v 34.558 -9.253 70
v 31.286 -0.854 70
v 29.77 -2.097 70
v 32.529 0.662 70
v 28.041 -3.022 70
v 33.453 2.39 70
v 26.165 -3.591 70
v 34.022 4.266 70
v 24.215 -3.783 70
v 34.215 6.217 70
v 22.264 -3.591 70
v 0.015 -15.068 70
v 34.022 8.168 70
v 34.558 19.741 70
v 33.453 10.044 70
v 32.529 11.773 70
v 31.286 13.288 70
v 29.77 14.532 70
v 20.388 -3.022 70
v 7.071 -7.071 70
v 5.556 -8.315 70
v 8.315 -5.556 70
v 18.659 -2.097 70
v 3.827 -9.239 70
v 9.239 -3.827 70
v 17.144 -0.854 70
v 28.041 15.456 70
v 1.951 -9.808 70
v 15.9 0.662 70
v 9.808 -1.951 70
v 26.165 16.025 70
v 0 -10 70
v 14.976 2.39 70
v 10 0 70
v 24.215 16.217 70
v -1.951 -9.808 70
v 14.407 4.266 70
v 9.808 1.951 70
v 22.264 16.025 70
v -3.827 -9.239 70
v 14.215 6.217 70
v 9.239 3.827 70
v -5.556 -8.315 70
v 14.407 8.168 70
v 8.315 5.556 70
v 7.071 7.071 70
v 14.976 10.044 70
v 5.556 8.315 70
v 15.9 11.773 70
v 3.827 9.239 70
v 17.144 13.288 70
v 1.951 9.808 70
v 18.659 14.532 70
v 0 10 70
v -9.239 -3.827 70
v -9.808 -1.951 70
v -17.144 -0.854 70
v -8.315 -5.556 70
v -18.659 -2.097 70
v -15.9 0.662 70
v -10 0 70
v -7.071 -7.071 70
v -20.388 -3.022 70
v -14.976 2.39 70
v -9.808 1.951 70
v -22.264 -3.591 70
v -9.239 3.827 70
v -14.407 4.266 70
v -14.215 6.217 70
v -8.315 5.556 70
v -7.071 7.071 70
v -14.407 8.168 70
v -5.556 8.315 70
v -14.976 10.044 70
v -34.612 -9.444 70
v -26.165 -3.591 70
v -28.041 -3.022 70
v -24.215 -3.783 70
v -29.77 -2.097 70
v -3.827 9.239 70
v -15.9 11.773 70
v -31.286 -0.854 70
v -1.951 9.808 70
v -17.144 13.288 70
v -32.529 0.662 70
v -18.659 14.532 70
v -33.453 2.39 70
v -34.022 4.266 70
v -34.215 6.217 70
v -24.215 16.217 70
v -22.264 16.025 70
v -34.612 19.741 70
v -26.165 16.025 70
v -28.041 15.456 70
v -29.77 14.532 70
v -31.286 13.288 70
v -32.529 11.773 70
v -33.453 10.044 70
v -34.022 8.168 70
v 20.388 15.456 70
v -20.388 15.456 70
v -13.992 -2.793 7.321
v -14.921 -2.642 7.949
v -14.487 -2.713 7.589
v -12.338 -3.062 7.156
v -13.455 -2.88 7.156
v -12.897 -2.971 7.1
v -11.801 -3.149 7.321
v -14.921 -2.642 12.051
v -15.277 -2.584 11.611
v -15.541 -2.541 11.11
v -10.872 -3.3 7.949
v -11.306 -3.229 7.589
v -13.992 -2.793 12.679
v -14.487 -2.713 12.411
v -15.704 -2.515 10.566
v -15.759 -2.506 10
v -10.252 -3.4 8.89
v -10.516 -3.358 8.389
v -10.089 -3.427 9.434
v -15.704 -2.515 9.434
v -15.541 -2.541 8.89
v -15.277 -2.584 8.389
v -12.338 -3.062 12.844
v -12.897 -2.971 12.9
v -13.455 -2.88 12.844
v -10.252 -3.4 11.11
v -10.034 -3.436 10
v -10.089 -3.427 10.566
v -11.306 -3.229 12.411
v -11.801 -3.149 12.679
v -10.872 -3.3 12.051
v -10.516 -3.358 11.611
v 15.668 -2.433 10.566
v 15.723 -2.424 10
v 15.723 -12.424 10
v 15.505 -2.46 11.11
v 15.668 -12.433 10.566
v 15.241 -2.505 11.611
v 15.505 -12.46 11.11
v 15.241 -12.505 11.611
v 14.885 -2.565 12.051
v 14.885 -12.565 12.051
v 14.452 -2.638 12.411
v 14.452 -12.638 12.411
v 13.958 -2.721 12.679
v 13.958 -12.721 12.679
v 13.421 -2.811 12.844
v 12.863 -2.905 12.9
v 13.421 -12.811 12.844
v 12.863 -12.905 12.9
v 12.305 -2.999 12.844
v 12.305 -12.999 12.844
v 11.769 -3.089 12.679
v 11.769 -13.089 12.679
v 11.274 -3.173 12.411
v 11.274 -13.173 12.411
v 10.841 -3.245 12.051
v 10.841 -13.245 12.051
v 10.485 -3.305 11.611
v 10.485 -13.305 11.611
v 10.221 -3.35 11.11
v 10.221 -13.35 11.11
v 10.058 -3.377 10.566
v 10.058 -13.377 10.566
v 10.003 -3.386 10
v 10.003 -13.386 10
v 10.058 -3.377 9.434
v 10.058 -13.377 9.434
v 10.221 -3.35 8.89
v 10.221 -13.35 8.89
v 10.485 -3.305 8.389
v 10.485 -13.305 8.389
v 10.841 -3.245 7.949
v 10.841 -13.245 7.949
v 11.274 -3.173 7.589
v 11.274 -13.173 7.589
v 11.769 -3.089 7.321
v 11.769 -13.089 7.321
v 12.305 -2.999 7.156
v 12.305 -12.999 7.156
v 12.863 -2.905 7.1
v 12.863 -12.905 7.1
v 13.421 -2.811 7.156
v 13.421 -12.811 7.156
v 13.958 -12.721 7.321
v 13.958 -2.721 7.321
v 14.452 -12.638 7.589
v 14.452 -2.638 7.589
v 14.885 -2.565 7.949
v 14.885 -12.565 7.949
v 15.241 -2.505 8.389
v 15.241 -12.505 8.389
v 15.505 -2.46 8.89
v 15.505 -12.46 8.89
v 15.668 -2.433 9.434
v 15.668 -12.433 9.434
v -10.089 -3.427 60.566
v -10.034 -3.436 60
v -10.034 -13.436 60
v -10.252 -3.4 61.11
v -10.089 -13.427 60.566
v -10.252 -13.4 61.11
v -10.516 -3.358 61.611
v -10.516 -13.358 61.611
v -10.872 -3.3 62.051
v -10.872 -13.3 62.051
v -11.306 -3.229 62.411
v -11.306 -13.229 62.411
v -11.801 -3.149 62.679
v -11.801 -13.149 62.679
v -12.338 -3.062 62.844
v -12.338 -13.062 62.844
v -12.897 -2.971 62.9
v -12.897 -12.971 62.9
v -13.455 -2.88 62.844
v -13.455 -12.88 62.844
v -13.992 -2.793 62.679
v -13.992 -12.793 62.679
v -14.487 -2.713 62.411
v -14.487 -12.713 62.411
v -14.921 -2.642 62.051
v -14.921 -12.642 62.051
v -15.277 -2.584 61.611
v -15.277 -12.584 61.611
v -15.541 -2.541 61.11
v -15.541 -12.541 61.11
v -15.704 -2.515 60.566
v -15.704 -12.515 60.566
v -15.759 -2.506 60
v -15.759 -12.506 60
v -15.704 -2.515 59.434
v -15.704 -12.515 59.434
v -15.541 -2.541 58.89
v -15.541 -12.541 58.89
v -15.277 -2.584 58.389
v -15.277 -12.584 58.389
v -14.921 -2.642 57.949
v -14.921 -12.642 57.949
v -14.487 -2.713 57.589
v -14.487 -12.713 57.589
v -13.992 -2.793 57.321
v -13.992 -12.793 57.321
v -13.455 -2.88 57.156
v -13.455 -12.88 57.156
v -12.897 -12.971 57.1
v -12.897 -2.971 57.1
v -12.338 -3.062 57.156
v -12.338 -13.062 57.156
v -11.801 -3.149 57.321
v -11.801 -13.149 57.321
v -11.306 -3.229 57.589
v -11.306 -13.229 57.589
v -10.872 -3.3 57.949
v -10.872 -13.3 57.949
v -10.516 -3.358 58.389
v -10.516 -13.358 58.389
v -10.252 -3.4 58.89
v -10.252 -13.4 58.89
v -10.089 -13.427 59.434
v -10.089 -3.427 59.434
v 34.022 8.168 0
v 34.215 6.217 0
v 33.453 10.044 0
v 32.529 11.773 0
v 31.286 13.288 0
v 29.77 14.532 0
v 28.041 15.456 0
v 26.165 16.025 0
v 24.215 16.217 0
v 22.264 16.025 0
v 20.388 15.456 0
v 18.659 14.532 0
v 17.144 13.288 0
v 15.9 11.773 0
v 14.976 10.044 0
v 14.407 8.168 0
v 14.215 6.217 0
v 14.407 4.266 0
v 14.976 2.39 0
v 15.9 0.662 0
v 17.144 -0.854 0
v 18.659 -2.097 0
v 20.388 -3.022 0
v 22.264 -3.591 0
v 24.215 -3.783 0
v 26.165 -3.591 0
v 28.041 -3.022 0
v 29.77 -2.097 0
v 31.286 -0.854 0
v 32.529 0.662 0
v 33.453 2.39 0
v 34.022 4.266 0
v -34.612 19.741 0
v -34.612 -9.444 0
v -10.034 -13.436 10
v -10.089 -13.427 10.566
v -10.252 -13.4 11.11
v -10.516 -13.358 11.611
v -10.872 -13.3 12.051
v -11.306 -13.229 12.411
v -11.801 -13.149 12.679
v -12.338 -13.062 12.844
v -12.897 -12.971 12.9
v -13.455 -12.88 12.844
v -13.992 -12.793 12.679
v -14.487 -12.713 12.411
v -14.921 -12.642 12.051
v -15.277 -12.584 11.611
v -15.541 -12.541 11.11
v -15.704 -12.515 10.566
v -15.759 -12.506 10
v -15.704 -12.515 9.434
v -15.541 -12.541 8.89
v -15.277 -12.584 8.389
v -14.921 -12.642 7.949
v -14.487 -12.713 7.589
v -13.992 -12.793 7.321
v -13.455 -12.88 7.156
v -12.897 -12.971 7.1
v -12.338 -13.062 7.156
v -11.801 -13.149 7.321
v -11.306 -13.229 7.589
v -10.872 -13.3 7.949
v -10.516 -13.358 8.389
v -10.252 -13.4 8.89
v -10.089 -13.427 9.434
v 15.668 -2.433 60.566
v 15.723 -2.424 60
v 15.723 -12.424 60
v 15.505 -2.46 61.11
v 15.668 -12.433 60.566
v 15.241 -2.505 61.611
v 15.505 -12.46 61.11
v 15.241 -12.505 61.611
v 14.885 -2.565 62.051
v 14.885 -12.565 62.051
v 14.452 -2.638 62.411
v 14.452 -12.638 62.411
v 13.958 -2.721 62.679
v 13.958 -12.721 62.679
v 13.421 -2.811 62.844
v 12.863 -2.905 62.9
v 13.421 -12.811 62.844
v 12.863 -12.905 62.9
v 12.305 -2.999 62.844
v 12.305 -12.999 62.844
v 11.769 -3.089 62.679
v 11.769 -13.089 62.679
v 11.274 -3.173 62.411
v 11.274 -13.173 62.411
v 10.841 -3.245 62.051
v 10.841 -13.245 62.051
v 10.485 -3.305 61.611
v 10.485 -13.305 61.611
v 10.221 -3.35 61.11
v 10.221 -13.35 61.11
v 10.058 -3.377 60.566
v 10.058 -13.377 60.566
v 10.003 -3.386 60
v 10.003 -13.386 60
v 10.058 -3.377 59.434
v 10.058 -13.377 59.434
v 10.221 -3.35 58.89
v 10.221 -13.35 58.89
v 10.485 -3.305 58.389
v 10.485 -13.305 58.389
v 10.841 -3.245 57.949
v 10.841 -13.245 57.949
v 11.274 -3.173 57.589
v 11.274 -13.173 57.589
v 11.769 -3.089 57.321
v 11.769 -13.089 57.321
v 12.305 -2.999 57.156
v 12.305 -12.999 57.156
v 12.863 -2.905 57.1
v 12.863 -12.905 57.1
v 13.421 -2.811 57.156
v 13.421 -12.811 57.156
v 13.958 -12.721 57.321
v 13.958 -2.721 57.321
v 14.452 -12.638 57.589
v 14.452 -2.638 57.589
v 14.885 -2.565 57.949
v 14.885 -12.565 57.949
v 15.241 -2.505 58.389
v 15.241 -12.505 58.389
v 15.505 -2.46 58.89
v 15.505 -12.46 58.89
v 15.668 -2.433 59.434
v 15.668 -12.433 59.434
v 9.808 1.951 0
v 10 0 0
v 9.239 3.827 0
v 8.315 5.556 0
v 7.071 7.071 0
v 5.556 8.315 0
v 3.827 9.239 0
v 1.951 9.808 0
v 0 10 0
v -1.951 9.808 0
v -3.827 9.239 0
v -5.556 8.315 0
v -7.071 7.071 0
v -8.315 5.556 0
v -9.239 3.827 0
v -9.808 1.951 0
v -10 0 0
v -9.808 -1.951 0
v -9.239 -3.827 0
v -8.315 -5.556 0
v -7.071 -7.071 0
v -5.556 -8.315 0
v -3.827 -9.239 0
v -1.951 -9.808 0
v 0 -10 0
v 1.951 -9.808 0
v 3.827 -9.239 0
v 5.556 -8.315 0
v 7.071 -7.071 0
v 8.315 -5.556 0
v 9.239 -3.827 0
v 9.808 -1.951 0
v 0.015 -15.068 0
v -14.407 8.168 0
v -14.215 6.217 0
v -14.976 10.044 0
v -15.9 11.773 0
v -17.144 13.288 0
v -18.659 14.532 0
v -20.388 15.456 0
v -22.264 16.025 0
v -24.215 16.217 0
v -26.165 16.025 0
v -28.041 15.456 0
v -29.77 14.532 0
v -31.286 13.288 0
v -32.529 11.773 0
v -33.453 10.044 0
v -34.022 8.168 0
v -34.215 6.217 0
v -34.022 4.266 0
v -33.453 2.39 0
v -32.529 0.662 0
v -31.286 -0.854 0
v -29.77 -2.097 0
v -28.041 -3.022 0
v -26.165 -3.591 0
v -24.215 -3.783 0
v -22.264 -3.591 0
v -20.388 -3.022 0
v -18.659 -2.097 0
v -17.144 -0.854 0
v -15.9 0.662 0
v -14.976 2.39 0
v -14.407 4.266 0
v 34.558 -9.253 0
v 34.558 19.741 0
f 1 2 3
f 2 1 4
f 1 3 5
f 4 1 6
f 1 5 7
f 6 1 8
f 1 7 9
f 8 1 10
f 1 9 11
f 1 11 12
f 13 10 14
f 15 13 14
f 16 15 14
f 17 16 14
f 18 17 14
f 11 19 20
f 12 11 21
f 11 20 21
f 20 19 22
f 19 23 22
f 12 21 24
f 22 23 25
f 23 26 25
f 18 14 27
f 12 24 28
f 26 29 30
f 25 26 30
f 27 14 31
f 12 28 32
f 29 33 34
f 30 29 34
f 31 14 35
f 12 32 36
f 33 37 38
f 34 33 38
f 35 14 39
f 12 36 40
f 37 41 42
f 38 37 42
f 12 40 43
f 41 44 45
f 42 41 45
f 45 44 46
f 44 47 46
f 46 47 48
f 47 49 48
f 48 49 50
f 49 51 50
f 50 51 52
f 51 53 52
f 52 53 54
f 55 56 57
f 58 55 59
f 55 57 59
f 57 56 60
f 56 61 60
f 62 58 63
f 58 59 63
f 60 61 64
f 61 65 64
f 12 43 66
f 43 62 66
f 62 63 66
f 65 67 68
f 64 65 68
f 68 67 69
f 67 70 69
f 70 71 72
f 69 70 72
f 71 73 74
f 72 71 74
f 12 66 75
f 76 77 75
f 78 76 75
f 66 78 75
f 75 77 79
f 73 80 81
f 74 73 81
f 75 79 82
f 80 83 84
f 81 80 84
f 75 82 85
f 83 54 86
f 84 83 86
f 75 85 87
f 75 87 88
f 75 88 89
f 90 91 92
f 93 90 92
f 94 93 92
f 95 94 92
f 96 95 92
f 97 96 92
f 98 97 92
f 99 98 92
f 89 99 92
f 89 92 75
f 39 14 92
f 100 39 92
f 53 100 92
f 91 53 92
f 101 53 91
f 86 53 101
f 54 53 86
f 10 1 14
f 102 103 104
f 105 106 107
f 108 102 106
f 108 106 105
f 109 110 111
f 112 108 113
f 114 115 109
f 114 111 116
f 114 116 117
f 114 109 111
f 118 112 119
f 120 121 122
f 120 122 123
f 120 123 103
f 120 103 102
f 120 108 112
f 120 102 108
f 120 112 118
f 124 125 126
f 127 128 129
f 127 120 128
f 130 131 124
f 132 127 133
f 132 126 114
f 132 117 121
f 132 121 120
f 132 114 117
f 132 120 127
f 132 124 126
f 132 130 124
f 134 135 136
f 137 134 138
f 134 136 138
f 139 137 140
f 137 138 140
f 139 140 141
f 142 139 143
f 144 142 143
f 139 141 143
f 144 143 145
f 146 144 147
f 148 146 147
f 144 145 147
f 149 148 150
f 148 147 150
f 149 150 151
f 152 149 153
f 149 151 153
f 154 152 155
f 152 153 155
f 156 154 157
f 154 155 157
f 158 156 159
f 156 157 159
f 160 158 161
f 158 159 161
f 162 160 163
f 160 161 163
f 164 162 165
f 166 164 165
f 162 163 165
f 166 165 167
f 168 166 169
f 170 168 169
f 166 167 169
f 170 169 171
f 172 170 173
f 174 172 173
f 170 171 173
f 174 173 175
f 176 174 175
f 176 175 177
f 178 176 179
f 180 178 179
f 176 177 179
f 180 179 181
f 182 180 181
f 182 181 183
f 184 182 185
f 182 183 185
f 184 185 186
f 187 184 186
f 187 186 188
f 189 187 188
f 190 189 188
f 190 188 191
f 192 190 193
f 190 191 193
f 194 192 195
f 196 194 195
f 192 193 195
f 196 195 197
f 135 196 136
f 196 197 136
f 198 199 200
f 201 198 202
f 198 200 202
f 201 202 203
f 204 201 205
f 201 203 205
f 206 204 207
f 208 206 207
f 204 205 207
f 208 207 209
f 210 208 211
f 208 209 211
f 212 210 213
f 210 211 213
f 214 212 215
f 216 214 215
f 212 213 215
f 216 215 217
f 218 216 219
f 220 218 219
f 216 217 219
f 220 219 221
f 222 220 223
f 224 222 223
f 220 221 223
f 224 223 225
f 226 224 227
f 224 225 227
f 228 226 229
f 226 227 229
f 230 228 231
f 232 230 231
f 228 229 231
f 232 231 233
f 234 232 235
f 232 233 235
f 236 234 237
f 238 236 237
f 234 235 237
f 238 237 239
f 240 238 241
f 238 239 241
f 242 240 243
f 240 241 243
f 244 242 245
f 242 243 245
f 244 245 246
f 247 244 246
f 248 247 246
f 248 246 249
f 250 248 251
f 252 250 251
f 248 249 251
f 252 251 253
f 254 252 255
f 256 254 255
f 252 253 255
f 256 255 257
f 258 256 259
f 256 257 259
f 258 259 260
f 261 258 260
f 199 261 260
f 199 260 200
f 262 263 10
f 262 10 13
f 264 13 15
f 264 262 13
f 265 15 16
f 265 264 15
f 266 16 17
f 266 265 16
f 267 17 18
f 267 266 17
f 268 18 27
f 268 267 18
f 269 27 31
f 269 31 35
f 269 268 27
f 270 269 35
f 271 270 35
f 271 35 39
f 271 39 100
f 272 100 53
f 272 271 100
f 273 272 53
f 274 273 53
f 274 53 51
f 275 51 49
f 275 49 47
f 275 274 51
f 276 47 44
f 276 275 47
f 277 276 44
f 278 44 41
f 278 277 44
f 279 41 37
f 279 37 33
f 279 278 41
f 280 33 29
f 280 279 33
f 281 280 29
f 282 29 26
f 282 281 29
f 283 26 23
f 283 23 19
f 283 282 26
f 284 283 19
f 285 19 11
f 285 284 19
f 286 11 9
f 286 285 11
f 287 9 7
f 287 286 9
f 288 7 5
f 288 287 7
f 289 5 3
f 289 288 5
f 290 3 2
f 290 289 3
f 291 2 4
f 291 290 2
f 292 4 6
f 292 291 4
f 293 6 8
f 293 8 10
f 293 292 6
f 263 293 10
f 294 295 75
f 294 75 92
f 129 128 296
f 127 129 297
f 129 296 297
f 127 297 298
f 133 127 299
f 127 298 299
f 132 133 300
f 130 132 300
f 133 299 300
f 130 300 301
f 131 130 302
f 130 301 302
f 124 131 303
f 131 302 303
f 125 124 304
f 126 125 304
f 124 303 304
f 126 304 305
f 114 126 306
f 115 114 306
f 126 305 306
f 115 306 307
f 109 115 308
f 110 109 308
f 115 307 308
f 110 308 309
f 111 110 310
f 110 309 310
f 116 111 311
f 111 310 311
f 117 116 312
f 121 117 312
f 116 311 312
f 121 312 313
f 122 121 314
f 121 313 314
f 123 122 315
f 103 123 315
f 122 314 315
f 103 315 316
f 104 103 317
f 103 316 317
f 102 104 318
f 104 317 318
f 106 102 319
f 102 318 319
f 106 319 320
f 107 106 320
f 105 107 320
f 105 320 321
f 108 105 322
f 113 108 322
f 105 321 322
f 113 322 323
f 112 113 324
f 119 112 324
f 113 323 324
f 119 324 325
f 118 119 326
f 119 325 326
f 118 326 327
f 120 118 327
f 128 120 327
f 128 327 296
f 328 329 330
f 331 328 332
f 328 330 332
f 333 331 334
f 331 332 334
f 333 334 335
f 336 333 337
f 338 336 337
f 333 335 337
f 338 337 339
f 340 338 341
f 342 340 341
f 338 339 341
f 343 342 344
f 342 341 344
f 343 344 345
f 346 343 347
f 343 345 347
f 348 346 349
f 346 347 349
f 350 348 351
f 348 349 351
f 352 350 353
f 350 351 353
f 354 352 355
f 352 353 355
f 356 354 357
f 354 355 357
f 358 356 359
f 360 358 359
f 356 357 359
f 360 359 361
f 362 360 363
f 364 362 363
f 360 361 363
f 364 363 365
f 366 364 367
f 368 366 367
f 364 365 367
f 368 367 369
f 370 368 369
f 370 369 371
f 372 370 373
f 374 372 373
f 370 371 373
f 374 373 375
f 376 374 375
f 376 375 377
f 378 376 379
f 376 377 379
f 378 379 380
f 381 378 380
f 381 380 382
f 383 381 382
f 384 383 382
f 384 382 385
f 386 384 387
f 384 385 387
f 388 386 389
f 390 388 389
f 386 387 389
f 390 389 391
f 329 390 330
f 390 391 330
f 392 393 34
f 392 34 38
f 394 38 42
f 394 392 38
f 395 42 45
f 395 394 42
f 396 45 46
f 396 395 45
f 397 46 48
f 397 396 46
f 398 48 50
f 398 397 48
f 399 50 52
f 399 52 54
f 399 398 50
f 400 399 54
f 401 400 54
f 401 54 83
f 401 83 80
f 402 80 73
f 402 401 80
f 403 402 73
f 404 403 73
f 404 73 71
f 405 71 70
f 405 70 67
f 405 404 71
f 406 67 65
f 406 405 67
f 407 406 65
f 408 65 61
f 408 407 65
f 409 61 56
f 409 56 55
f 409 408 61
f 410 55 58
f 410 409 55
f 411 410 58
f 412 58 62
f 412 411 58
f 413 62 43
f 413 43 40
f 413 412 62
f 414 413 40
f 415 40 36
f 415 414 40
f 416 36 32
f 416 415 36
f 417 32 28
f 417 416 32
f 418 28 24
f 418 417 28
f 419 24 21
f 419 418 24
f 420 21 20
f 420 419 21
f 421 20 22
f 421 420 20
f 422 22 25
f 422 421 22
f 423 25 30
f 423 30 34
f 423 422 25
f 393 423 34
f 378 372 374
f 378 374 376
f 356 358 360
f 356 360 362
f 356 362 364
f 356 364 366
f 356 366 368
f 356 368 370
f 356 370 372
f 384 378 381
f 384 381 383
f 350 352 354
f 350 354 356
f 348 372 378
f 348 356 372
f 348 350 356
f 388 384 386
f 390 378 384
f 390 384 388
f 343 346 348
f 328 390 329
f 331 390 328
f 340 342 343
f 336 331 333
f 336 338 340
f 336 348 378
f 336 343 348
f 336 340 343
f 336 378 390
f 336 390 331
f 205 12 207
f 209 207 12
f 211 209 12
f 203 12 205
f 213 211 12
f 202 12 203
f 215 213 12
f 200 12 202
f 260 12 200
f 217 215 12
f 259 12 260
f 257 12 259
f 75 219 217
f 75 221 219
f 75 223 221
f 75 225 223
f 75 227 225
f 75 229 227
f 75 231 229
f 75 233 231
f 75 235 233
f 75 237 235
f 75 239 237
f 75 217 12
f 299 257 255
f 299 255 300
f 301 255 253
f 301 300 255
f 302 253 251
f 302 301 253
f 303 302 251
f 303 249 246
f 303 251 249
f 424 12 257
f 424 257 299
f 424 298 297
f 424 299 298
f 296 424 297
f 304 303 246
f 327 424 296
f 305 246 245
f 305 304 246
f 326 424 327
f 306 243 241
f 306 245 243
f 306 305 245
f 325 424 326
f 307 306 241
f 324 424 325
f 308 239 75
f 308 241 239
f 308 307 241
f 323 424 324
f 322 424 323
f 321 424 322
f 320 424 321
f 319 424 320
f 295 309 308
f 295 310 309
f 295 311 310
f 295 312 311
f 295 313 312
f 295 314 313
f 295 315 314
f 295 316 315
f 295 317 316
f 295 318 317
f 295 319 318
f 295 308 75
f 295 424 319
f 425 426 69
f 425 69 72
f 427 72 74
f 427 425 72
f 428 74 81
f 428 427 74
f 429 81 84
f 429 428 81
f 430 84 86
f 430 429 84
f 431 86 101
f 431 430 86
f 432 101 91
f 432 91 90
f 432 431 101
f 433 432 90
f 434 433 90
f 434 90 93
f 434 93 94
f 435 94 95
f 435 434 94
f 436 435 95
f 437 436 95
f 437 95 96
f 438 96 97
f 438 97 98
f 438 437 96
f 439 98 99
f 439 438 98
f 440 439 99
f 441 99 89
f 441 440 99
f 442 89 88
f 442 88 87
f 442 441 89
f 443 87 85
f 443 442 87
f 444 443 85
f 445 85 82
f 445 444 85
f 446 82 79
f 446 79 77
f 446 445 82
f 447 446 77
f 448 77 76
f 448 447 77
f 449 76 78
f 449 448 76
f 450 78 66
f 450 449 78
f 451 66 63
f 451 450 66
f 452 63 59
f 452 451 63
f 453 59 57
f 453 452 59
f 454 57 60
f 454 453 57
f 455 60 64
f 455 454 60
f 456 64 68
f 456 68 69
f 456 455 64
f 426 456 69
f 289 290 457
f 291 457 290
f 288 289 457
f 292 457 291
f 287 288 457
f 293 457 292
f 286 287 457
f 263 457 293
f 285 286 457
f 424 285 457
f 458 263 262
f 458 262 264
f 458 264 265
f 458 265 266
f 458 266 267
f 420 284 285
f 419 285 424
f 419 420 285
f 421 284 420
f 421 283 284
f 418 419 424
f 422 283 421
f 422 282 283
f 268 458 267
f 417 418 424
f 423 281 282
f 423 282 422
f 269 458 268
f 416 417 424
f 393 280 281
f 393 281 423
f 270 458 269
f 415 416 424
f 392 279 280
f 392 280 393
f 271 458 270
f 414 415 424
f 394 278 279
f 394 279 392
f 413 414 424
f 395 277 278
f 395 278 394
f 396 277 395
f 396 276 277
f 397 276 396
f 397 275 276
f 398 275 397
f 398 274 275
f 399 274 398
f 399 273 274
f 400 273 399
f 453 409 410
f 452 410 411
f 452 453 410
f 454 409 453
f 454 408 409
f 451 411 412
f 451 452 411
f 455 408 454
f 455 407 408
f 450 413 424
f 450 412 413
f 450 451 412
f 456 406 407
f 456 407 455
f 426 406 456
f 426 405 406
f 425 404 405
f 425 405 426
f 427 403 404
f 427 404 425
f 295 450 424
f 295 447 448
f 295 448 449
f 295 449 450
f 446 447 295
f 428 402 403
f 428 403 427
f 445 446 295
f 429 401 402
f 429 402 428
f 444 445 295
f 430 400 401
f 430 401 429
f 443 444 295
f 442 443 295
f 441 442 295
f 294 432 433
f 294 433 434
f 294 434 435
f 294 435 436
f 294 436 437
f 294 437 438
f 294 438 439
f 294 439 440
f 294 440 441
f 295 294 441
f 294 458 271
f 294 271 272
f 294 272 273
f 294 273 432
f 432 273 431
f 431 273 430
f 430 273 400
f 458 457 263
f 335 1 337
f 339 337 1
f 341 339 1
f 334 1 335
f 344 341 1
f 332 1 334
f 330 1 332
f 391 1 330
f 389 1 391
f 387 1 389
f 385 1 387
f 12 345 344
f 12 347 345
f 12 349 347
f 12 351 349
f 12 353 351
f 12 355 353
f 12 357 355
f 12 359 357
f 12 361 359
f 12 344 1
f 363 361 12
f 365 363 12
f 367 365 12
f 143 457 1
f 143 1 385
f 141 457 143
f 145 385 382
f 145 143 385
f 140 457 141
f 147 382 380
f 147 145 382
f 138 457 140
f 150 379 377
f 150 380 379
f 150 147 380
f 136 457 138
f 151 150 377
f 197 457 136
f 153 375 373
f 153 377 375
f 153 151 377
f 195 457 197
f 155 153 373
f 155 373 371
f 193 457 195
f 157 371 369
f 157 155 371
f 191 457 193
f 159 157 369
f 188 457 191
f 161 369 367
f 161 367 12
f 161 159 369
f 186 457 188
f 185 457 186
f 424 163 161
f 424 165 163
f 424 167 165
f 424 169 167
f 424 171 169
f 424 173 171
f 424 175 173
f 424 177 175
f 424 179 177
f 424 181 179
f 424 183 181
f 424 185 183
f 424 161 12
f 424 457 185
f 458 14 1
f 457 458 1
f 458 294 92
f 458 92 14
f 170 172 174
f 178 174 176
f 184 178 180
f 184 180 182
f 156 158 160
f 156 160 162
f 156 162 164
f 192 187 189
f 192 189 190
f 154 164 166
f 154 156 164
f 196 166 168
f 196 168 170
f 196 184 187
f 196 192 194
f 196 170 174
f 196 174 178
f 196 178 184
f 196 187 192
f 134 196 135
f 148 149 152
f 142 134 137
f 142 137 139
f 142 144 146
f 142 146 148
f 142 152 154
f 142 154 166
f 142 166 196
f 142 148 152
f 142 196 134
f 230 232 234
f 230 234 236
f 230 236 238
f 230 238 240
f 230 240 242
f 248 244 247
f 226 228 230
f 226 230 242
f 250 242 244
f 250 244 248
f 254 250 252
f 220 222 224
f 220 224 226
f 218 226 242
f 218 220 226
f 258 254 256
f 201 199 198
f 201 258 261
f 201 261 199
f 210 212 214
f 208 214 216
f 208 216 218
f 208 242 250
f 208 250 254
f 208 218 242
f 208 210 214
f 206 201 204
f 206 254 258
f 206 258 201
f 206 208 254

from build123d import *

# Parameters (mm, degrees)
IZIM1_R                     = 10
Y_KSEKLIK_EKSTR_ZYON2_DEPTH = 70
IZIM4_R                     = 2.9
KES_EKSTR_ZYON1_DEPTH       = 10
IZIM6_R                     = 2.9
KES_EKSTR_ZYON2_DEPTH       = 10


with BuildPart() as part:
    # Çizim1 → Yükseklik-Ekstrüzyon2 (new body)
    with BuildSketch(Plane.XY):
        Polygon((34.558000078, -9.253153646), (0.014602542, -15.067885605), (-34.611999922, -9.444150005), (-34.611999922, 19.740712429), (34.558000078, 19.740712429), align=None)
        with Locations((-24.214579028, 6.217247179)):
            Circle(IZIM1_R, mode=Mode.SUBTRACT)
        Circle(IZIM1_R, mode=Mode.SUBTRACT)
        with Locations((24.214579028, 6.217247179)):
            Circle(IZIM1_R, mode=Mode.SUBTRACT)
    extrude(amount=Y_KSEKLIK_EKSTR_ZYON2_DEPTH)

    # Çizim4 → Kes-Ekstrüzyon1 (cut, along a direction that is not the sketch's normal)
    with BuildSketch(Plane(origin=(-2.383921421, -14.678339313, 0), x_dir=(0.9870666640552537, -0.1603103262763605, 0), z_dir=(-0.1603103262763605, -0.9870666640552537, 0))):
        with Locations((-10.65035653, 60)):
            Circle(IZIM4_R)
        with Locations((-10.65035653, 10)):
            Circle(IZIM4_R)
    extrude(amount=-KES_EKSTR_ZYON1_DEPTH, dir=(0, -1, 0), mode=Mode.SUBTRACT)

    # Çizim6 → Kes-Ekstrüzyon2 (cut, along a direction that is not the sketch's normal)
    with BuildSketch(Plane(origin=(2.466908381, -14.655085992, 0), x_dir=(0.9861264495259806, 0.16599586002453082, 0), z_dir=(0.16599586002453082, -0.9861264495259807, 0))):
        with Locations((10.542572723, 60)):
            Circle(IZIM6_R)
        with Locations((10.542572723, 10)):
            Circle(IZIM6_R)
    extrude(amount=-KES_EKSTR_ZYON2_DEPTH, dir=(0, -1, 0), mode=Mode.SUBTRACT)


solid = part.part
